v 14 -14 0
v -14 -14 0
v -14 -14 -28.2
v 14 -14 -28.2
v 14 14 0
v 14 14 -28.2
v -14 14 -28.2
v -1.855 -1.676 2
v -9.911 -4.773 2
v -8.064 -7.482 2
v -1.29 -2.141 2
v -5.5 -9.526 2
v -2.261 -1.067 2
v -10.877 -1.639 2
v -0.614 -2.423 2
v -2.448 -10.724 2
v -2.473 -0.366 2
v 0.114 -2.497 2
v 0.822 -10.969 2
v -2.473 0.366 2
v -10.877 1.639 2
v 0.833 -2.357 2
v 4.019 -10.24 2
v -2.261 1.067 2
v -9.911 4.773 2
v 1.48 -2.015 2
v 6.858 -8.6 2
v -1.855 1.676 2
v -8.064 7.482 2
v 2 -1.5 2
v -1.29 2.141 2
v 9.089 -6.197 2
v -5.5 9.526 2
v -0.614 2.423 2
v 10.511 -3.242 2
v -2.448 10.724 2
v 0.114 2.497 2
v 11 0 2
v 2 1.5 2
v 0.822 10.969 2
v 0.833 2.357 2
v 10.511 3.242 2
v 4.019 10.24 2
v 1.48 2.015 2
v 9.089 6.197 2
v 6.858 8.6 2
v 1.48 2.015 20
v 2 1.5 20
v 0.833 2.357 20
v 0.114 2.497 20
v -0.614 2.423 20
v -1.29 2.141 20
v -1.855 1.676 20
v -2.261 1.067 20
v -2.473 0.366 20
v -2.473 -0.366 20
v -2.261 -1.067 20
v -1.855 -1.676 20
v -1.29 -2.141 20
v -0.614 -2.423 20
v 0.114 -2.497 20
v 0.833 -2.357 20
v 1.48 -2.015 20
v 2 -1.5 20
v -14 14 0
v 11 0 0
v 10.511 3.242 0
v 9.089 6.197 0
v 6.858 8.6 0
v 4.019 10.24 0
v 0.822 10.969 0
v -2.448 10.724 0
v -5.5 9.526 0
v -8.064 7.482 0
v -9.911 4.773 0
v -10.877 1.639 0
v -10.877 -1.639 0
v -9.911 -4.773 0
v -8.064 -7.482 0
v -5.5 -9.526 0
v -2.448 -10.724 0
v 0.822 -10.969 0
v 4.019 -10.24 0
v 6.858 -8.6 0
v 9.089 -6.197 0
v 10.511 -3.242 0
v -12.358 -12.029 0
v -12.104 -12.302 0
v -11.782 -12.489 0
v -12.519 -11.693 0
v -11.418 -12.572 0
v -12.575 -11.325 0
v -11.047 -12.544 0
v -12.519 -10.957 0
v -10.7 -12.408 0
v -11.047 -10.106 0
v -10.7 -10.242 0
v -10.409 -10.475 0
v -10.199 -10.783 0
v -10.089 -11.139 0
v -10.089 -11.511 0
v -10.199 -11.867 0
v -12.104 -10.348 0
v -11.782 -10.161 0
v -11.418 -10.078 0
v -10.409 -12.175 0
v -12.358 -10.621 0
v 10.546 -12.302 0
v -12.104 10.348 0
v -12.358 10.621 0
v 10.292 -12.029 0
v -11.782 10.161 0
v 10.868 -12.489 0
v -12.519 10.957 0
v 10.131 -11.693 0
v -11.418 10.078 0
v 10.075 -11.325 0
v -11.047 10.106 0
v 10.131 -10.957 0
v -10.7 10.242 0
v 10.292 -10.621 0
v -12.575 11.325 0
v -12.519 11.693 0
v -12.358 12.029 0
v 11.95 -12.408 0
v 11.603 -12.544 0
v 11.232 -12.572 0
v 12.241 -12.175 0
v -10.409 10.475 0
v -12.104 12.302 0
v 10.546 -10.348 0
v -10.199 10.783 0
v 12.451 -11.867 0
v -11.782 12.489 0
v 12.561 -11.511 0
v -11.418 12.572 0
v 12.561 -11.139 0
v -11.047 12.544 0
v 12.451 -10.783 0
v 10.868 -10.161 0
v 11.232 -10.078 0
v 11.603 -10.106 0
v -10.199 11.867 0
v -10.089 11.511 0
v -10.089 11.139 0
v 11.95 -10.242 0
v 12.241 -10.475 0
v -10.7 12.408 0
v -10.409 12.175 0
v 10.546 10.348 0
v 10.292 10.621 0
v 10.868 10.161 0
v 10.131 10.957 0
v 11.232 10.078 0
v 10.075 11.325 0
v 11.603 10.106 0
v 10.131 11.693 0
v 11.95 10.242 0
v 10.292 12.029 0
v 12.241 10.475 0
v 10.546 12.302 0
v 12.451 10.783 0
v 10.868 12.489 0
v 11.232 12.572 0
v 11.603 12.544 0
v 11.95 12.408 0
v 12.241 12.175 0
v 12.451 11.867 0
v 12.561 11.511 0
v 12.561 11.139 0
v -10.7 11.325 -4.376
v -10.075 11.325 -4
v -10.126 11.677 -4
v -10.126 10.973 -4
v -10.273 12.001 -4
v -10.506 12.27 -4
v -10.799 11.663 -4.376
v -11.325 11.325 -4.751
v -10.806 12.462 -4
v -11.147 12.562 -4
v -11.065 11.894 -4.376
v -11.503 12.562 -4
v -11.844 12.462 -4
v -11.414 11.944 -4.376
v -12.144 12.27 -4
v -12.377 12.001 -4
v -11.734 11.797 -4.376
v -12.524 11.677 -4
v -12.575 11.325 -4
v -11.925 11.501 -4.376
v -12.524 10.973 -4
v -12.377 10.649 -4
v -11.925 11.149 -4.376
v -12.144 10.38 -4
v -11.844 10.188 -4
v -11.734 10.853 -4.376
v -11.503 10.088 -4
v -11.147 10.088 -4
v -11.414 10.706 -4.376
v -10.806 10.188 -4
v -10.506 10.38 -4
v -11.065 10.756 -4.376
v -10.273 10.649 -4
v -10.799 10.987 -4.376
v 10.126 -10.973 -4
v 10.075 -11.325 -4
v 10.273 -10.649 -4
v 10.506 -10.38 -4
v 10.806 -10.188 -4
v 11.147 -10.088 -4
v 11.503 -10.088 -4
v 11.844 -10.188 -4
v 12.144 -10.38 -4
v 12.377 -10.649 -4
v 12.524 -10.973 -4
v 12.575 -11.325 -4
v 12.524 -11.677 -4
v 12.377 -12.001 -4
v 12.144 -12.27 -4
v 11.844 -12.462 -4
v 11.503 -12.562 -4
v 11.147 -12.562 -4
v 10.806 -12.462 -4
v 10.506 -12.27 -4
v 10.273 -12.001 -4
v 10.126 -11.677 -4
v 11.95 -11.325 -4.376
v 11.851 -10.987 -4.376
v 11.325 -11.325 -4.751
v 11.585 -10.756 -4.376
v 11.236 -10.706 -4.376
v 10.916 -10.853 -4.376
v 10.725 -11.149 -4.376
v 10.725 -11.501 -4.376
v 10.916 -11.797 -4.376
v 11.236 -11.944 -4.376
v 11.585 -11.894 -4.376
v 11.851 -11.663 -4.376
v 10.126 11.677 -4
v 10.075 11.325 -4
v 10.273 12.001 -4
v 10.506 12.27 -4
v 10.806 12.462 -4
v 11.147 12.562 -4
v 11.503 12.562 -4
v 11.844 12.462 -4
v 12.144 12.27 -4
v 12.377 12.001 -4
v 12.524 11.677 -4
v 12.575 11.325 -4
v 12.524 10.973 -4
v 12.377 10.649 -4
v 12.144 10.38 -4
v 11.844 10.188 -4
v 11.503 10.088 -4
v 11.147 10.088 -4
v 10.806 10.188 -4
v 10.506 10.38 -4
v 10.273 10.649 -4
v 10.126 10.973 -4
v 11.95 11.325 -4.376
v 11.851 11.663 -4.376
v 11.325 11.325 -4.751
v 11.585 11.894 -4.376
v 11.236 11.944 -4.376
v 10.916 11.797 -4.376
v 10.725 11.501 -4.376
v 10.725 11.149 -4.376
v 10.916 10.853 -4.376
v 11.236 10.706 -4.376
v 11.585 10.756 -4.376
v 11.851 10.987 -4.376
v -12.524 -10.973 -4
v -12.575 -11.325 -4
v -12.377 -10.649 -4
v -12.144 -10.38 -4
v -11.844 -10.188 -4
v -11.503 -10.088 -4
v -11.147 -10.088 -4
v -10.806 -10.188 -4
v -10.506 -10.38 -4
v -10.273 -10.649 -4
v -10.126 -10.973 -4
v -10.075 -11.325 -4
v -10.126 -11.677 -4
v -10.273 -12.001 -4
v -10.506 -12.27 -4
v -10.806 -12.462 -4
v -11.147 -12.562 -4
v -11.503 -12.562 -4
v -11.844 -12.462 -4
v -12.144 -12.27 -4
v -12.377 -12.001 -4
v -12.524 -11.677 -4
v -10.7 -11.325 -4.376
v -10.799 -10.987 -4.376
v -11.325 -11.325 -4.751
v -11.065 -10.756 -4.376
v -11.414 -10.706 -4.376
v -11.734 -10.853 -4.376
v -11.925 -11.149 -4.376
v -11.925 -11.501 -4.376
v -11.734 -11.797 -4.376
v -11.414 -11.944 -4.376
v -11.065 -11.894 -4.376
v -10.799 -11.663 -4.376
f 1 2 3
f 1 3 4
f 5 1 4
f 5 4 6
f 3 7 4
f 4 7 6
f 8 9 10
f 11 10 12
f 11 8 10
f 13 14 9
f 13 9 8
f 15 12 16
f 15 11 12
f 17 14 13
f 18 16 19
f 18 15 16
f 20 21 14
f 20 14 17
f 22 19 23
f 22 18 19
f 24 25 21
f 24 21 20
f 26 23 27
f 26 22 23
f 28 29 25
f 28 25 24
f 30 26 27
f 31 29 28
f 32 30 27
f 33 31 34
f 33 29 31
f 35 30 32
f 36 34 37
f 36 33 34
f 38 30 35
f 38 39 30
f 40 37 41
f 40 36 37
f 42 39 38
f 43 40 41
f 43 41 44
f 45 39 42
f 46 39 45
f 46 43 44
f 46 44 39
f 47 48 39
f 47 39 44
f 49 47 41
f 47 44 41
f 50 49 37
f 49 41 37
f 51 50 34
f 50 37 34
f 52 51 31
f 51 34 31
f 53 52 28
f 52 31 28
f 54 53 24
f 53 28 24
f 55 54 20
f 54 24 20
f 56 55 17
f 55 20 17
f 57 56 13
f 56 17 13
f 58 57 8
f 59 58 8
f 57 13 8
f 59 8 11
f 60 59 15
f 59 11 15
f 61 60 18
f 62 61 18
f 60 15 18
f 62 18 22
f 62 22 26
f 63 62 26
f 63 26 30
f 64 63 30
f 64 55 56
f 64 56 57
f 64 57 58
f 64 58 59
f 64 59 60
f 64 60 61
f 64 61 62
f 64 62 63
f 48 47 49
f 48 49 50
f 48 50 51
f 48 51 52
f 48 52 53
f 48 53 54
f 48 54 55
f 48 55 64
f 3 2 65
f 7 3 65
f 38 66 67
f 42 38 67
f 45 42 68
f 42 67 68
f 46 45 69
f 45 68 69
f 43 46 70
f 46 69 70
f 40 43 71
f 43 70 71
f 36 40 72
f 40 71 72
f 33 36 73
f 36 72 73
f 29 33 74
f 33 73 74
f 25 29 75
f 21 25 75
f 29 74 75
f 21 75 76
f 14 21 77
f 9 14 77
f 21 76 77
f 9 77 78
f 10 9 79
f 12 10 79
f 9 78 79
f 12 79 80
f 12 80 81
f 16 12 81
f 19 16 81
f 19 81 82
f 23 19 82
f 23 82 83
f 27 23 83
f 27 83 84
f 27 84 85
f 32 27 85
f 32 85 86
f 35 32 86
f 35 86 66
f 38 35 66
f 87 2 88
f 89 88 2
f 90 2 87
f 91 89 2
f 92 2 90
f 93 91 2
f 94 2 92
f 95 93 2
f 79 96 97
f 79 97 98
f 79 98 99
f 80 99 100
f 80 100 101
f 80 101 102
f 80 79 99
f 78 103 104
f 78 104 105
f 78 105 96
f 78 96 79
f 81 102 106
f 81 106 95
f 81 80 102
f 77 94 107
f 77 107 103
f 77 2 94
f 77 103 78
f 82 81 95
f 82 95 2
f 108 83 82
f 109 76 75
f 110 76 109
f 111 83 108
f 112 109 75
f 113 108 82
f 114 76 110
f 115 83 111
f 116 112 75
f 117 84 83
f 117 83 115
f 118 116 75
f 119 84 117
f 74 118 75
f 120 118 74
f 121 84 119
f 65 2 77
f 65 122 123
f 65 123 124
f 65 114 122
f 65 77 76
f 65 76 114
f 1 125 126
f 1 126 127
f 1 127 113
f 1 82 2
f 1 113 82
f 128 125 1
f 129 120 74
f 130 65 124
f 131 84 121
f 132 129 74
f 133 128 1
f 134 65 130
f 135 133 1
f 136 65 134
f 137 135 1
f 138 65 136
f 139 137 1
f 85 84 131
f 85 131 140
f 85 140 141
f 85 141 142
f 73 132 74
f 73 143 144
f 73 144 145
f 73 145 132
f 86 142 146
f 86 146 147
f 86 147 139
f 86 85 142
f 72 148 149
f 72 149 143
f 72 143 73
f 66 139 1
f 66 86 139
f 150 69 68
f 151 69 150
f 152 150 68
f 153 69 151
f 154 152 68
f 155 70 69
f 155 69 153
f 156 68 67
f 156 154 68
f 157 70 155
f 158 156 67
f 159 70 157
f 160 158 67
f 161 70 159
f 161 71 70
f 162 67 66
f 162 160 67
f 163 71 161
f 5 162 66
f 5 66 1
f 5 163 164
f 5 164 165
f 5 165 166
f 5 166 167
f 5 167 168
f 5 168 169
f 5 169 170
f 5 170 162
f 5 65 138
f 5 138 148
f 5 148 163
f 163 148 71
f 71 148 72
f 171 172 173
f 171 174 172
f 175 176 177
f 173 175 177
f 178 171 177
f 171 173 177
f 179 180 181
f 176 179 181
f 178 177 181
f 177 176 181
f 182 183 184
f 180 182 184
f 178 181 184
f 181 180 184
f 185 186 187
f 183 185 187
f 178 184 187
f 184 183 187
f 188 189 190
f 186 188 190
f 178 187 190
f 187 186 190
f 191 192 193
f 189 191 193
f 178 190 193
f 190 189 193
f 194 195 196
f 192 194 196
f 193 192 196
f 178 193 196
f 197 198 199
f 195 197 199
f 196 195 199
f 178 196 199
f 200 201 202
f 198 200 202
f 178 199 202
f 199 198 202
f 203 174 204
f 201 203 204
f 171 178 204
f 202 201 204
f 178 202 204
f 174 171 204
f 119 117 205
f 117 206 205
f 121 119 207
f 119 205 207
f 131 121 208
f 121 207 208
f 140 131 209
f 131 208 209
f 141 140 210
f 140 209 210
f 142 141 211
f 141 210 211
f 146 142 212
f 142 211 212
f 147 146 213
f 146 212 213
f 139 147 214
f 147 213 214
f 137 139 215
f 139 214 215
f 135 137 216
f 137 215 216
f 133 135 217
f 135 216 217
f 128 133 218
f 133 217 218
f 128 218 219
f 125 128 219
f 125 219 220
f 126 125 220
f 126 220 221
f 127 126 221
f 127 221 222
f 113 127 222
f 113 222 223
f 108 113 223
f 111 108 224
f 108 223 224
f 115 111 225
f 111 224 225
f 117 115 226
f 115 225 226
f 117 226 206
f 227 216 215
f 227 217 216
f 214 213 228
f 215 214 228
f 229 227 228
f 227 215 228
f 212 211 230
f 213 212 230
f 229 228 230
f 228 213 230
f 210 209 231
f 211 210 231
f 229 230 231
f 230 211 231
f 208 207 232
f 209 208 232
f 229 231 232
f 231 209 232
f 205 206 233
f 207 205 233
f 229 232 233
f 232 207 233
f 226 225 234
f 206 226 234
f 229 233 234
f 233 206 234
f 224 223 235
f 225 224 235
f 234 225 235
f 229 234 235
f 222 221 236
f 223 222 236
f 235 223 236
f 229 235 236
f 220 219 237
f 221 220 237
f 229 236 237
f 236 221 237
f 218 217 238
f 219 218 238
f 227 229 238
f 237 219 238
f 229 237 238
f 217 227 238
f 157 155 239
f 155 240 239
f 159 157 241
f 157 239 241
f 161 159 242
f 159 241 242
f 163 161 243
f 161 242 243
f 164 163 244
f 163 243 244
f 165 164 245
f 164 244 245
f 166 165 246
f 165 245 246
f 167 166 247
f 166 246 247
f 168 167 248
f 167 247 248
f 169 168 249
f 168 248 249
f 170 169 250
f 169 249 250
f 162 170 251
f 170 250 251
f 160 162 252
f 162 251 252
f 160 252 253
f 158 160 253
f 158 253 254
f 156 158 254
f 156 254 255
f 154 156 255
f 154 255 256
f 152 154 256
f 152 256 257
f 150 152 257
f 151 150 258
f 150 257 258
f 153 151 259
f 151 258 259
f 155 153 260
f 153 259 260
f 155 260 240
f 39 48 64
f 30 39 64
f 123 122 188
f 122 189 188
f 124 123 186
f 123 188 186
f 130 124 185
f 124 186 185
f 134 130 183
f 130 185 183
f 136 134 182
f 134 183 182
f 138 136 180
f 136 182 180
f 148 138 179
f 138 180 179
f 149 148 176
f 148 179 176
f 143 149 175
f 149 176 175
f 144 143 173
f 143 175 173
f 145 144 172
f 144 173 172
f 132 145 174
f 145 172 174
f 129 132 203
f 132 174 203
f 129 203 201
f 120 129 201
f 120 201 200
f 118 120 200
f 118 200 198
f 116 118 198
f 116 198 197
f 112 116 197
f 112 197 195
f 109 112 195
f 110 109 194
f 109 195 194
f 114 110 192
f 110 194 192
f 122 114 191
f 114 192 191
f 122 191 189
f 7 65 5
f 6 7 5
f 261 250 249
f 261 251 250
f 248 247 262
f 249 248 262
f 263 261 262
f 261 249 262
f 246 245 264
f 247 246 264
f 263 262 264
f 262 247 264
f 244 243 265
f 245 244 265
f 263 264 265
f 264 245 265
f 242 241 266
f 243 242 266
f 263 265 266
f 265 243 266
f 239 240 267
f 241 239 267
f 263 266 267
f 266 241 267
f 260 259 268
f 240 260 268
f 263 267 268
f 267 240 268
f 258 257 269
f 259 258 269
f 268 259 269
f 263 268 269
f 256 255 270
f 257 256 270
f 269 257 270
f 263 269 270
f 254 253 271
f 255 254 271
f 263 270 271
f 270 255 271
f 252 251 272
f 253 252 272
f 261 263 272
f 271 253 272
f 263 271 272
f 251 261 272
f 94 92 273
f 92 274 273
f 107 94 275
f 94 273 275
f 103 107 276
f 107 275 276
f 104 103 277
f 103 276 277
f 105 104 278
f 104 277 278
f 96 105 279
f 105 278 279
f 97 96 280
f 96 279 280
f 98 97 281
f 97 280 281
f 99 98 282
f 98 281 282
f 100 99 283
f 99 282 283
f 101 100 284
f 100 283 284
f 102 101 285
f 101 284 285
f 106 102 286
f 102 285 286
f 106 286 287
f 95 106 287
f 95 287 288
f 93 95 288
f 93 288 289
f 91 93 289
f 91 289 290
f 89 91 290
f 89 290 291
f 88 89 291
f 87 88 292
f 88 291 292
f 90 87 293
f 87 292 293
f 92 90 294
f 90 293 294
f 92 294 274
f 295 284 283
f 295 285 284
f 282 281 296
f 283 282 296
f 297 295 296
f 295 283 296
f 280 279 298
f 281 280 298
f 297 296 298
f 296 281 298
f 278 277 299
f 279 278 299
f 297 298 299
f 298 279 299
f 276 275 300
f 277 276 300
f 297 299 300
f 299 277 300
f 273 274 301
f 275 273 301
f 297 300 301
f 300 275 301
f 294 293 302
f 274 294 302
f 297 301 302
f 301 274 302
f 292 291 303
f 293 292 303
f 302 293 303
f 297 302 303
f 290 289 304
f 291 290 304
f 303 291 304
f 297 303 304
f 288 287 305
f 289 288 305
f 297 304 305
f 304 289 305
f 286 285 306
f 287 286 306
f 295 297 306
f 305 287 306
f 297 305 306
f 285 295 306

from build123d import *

# Parameters (mm, degrees)
SKETCH2_W                 = 28
SKETCH2_H                 = 28
BOSS_EXTRUDE1_DEPTH       = 28.2
SKETCH3_R                 = 11
BOSS_EXTRUDE2_DEPTH       = 2
SKETCH4_R                 = 2.5
BOSS_EXTRUDE3_DEPTH       = 20
CUT_EXTRUDE1_DEPTH        = 18
F_2_5MM_DOWEL_HOLE1_D     = 2.5
F_2_5MM_DOWEL_HOLE1_DEPTH = 4
F_2_5MM_DOWEL_HOLE1_TIP   = 0.751075774


with BuildPart() as part:
    # Sketch2 → Boss-Extrude1 (new body)
    with BuildSketch(Plane.XY):
        Rectangle(SKETCH2_W, SKETCH2_H)
    extrude(amount=-BOSS_EXTRUDE1_DEPTH)

    # Sketch3 → Boss-Extrude2 (add)
    with BuildSketch(Plane.XY):
        Circle(SKETCH3_R)
    extrude(amount=BOSS_EXTRUDE2_DEPTH)

    # Sketch4 → Boss-Extrude3 (add)
    with BuildSketch(Plane.XY):
        Circle(SKETCH4_R)
    extrude(amount=BOSS_EXTRUDE3_DEPTH)

    # Sketch5 → Cut-Extrude1 (cut)
    with BuildSketch(Plane.XY.offset(20)):
        Polygon((2, 56.05333882), (2, 1.5), (2, -1.5), (2, -56.05333882), (111.10667764, -56.05333882), (111.10667764, 56.05333882), align=None)
    extrude(amount=-CUT_EXTRUDE1_DEPTH, mode=Mode.SUBTRACT)

    # Ø2.5mm Dowel Hole1
    with Locations(Plane.XY):
        with Locations((-11.325, 11.325), (11.325, 11.325), (11.325, -11.325), (-11.325, -11.325)):
            Hole(F_2_5MM_DOWEL_HOLE1_D / 2, depth=F_2_5MM_DOWEL_HOLE1_DEPTH)
            with Locations((0, 0, -(F_2_5MM_DOWEL_HOLE1_DEPTH + F_2_5MM_DOWEL_HOLE1_TIP / 2))):  # 118° drill point
                Cone(0, F_2_5MM_DOWEL_HOLE1_D / 2, F_2_5MM_DOWEL_HOLE1_TIP, mode=Mode.SUBTRACT)


solid = part.part
